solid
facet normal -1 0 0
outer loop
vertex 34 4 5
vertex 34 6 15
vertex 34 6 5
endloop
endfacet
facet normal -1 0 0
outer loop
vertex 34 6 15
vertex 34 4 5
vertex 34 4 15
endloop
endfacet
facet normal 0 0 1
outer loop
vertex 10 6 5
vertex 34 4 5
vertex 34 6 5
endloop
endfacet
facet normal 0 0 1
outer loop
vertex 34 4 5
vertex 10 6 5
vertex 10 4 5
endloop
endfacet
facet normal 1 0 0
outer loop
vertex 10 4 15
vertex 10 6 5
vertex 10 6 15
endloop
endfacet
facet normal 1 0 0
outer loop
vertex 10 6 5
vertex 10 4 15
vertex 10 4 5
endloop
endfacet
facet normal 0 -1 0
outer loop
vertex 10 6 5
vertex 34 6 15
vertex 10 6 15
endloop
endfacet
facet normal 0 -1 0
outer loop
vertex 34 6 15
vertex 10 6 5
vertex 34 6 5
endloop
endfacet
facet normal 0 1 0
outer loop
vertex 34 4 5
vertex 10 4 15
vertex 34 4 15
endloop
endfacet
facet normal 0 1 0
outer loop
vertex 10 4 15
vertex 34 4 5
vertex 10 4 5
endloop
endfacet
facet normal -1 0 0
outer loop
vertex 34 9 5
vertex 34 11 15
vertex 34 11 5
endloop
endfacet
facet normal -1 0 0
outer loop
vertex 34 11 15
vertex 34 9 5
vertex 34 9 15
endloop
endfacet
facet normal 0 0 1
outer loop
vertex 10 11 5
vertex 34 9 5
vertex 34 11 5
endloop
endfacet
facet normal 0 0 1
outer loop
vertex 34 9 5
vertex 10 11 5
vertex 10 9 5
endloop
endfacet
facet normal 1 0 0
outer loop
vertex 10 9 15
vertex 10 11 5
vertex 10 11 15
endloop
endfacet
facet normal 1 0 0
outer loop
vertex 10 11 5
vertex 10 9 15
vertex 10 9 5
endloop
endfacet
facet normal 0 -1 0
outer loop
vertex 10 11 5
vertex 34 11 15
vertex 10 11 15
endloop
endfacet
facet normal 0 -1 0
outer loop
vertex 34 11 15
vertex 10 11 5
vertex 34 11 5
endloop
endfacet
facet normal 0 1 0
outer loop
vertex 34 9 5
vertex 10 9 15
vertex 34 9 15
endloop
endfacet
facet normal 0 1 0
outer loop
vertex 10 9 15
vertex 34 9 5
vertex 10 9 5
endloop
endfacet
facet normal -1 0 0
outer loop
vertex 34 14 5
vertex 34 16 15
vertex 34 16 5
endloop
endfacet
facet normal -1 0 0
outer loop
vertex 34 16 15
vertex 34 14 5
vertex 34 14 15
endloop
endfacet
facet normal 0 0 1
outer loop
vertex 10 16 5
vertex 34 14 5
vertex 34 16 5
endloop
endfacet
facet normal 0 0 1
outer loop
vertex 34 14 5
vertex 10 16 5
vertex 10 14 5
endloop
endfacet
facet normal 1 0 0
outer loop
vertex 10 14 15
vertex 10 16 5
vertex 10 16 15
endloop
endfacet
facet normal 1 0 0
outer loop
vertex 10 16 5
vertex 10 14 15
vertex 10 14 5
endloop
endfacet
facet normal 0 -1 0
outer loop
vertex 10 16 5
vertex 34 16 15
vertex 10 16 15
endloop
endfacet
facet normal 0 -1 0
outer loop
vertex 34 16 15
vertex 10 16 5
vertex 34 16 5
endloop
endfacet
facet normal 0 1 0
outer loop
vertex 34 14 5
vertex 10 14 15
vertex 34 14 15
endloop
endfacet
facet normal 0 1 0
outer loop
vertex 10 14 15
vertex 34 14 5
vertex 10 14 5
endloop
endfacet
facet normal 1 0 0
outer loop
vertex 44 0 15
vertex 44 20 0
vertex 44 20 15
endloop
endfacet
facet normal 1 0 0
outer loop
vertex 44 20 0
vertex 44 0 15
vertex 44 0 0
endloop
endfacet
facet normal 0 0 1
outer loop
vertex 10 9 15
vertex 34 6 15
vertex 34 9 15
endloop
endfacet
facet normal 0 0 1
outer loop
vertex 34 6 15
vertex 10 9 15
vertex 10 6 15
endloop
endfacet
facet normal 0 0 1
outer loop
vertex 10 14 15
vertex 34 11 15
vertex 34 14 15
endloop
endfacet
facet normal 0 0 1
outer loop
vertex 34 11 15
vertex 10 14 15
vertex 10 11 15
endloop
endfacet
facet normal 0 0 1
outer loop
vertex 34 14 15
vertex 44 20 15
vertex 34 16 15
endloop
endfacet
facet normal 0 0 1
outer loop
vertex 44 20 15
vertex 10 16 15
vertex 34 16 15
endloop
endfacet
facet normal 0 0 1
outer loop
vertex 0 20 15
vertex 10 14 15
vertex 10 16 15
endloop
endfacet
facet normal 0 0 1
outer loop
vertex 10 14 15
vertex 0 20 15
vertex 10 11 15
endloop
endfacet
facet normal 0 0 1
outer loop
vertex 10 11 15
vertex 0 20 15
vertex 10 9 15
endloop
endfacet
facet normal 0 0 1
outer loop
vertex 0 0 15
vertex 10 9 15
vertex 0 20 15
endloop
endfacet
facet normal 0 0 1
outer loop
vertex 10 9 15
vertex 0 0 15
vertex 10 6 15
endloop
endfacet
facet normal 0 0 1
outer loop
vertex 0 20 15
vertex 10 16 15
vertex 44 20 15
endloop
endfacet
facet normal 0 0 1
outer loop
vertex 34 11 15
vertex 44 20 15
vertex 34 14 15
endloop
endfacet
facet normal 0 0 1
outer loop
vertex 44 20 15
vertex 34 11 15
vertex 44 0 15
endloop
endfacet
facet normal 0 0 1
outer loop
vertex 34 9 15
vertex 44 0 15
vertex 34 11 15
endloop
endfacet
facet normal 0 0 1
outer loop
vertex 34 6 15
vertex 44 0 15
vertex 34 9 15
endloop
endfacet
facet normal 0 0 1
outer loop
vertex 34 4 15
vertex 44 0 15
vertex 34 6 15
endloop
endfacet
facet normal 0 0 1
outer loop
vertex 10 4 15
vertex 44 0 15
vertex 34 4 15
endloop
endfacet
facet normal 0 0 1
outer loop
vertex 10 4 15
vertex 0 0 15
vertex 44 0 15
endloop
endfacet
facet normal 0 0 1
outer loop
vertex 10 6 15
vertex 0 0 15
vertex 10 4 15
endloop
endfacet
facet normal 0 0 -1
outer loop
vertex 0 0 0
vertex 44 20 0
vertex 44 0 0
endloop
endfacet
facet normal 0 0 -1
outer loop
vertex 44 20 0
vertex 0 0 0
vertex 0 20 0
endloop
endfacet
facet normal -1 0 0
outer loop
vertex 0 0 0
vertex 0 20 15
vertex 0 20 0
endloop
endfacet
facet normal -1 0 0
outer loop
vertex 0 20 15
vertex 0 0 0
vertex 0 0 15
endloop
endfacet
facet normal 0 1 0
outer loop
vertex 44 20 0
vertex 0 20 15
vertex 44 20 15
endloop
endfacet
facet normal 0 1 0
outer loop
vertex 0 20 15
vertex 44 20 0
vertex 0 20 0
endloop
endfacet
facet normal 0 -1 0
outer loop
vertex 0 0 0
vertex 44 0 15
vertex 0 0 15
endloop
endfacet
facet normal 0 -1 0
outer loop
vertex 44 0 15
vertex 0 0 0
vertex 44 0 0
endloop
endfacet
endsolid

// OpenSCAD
n=3;
difference(){
	cube([24+10*2,5+5*n,15]);
	for(i=[0:n-1]) translate([10,4+i*5,5]) cube([24,2,40]);
}
